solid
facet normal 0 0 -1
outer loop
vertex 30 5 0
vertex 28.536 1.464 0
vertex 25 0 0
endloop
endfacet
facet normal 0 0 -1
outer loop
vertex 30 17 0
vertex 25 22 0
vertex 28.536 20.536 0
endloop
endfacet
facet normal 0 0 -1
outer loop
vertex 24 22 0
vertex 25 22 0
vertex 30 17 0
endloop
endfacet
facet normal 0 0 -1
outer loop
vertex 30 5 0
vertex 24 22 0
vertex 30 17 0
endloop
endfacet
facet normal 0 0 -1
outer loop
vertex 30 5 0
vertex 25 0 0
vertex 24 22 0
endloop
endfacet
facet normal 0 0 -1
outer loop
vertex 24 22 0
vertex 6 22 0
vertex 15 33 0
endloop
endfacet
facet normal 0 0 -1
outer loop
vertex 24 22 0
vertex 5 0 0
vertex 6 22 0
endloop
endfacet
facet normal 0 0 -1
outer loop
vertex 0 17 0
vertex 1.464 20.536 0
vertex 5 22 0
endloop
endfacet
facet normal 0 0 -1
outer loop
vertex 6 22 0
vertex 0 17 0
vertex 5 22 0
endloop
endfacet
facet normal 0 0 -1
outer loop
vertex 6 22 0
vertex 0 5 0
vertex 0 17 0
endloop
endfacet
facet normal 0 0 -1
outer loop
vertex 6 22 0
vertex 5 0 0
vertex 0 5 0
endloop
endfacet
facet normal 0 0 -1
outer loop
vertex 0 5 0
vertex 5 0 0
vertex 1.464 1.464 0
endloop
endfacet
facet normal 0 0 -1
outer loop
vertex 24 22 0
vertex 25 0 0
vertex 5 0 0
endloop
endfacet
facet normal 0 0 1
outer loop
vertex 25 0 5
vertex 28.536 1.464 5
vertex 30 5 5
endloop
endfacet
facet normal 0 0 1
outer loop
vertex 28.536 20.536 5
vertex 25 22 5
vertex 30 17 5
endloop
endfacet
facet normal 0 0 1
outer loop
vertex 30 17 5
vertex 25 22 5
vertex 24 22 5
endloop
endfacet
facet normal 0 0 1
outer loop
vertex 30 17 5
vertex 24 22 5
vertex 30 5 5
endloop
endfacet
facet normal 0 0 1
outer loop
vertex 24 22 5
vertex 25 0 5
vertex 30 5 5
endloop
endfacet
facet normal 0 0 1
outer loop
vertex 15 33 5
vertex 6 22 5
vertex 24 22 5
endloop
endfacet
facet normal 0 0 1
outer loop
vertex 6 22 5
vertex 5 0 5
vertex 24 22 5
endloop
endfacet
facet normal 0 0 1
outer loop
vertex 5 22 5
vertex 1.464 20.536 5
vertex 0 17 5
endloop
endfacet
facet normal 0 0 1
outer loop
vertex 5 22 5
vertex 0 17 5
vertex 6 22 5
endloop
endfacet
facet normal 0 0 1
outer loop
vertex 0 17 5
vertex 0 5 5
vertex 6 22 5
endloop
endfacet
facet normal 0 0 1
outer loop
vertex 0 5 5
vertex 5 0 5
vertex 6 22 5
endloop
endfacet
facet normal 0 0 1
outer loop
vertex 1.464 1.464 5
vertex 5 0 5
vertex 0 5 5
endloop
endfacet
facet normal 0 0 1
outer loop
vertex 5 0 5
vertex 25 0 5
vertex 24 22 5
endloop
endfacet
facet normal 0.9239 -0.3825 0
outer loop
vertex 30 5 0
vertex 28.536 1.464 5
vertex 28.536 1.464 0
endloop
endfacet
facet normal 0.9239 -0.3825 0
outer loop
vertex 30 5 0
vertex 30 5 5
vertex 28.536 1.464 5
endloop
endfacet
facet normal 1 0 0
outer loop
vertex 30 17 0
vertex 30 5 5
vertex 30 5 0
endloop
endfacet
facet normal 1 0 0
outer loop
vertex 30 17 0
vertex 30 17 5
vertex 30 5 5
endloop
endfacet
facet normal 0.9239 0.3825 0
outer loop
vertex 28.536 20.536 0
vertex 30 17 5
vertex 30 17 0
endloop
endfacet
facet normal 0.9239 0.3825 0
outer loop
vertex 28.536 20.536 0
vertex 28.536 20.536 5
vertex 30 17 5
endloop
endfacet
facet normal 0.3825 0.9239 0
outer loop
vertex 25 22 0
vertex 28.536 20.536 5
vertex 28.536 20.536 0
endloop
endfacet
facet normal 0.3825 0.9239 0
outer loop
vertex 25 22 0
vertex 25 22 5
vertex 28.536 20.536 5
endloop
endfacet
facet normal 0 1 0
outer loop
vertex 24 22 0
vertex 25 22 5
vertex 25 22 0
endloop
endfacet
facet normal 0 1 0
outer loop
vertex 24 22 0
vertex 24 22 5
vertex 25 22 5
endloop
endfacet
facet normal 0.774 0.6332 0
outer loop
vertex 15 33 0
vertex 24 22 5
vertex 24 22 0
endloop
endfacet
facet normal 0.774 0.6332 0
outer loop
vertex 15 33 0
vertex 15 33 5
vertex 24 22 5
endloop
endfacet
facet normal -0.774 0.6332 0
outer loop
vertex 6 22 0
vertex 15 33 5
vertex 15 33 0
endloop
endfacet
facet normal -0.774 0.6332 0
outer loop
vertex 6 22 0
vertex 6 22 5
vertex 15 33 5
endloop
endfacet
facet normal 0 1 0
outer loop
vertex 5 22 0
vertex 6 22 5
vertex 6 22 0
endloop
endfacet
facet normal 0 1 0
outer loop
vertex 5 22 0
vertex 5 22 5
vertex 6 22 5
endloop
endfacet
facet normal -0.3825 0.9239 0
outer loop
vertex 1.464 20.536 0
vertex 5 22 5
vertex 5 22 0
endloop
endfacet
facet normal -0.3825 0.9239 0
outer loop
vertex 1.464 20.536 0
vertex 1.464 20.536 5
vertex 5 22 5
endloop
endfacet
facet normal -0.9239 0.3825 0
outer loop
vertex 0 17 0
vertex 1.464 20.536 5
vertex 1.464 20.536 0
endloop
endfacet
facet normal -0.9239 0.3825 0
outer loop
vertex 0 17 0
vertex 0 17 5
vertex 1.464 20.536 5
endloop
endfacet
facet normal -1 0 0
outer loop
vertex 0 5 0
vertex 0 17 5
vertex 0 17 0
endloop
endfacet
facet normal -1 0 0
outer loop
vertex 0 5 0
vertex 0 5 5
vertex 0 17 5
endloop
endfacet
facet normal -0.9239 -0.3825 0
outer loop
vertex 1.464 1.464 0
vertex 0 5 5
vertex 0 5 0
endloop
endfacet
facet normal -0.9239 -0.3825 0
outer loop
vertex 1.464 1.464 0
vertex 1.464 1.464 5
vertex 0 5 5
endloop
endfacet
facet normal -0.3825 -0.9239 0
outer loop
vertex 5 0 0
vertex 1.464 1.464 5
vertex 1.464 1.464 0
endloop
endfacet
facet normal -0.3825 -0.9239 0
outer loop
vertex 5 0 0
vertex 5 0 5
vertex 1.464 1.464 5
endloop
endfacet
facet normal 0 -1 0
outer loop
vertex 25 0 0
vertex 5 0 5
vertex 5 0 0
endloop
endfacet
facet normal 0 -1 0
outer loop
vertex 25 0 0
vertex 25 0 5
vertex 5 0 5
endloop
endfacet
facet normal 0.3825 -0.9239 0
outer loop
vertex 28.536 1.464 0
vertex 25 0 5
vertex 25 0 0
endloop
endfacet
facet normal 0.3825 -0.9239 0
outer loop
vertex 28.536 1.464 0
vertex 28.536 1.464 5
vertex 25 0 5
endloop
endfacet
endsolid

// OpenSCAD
$fn = 32;

// ----------------------------------------------------------------------
// Ratchet pawl: 30 x 22 mm body, beak 11 mm сверху
// ----------------------------------------------------------------------

// --- parameters (mm) ---
profile_height = 5;       // extrusion height
profile_points = 15;      // points of the closed outline

profile = [[0, 5], [1.464, 1.464], [5, 0], [25, 0], [28.536, 1.464], [30, 5], [30, 17], [28.536, 20.536], [25, 22], [24, 22], [15, 33], [6, 22], [5, 22], [1.464, 20.536], [0, 17]];  // single closed polygon, 15 points, counter clockwise

// --- the one profile operation ---
linear_extrude(height = profile_height) polygon(points = profile);
